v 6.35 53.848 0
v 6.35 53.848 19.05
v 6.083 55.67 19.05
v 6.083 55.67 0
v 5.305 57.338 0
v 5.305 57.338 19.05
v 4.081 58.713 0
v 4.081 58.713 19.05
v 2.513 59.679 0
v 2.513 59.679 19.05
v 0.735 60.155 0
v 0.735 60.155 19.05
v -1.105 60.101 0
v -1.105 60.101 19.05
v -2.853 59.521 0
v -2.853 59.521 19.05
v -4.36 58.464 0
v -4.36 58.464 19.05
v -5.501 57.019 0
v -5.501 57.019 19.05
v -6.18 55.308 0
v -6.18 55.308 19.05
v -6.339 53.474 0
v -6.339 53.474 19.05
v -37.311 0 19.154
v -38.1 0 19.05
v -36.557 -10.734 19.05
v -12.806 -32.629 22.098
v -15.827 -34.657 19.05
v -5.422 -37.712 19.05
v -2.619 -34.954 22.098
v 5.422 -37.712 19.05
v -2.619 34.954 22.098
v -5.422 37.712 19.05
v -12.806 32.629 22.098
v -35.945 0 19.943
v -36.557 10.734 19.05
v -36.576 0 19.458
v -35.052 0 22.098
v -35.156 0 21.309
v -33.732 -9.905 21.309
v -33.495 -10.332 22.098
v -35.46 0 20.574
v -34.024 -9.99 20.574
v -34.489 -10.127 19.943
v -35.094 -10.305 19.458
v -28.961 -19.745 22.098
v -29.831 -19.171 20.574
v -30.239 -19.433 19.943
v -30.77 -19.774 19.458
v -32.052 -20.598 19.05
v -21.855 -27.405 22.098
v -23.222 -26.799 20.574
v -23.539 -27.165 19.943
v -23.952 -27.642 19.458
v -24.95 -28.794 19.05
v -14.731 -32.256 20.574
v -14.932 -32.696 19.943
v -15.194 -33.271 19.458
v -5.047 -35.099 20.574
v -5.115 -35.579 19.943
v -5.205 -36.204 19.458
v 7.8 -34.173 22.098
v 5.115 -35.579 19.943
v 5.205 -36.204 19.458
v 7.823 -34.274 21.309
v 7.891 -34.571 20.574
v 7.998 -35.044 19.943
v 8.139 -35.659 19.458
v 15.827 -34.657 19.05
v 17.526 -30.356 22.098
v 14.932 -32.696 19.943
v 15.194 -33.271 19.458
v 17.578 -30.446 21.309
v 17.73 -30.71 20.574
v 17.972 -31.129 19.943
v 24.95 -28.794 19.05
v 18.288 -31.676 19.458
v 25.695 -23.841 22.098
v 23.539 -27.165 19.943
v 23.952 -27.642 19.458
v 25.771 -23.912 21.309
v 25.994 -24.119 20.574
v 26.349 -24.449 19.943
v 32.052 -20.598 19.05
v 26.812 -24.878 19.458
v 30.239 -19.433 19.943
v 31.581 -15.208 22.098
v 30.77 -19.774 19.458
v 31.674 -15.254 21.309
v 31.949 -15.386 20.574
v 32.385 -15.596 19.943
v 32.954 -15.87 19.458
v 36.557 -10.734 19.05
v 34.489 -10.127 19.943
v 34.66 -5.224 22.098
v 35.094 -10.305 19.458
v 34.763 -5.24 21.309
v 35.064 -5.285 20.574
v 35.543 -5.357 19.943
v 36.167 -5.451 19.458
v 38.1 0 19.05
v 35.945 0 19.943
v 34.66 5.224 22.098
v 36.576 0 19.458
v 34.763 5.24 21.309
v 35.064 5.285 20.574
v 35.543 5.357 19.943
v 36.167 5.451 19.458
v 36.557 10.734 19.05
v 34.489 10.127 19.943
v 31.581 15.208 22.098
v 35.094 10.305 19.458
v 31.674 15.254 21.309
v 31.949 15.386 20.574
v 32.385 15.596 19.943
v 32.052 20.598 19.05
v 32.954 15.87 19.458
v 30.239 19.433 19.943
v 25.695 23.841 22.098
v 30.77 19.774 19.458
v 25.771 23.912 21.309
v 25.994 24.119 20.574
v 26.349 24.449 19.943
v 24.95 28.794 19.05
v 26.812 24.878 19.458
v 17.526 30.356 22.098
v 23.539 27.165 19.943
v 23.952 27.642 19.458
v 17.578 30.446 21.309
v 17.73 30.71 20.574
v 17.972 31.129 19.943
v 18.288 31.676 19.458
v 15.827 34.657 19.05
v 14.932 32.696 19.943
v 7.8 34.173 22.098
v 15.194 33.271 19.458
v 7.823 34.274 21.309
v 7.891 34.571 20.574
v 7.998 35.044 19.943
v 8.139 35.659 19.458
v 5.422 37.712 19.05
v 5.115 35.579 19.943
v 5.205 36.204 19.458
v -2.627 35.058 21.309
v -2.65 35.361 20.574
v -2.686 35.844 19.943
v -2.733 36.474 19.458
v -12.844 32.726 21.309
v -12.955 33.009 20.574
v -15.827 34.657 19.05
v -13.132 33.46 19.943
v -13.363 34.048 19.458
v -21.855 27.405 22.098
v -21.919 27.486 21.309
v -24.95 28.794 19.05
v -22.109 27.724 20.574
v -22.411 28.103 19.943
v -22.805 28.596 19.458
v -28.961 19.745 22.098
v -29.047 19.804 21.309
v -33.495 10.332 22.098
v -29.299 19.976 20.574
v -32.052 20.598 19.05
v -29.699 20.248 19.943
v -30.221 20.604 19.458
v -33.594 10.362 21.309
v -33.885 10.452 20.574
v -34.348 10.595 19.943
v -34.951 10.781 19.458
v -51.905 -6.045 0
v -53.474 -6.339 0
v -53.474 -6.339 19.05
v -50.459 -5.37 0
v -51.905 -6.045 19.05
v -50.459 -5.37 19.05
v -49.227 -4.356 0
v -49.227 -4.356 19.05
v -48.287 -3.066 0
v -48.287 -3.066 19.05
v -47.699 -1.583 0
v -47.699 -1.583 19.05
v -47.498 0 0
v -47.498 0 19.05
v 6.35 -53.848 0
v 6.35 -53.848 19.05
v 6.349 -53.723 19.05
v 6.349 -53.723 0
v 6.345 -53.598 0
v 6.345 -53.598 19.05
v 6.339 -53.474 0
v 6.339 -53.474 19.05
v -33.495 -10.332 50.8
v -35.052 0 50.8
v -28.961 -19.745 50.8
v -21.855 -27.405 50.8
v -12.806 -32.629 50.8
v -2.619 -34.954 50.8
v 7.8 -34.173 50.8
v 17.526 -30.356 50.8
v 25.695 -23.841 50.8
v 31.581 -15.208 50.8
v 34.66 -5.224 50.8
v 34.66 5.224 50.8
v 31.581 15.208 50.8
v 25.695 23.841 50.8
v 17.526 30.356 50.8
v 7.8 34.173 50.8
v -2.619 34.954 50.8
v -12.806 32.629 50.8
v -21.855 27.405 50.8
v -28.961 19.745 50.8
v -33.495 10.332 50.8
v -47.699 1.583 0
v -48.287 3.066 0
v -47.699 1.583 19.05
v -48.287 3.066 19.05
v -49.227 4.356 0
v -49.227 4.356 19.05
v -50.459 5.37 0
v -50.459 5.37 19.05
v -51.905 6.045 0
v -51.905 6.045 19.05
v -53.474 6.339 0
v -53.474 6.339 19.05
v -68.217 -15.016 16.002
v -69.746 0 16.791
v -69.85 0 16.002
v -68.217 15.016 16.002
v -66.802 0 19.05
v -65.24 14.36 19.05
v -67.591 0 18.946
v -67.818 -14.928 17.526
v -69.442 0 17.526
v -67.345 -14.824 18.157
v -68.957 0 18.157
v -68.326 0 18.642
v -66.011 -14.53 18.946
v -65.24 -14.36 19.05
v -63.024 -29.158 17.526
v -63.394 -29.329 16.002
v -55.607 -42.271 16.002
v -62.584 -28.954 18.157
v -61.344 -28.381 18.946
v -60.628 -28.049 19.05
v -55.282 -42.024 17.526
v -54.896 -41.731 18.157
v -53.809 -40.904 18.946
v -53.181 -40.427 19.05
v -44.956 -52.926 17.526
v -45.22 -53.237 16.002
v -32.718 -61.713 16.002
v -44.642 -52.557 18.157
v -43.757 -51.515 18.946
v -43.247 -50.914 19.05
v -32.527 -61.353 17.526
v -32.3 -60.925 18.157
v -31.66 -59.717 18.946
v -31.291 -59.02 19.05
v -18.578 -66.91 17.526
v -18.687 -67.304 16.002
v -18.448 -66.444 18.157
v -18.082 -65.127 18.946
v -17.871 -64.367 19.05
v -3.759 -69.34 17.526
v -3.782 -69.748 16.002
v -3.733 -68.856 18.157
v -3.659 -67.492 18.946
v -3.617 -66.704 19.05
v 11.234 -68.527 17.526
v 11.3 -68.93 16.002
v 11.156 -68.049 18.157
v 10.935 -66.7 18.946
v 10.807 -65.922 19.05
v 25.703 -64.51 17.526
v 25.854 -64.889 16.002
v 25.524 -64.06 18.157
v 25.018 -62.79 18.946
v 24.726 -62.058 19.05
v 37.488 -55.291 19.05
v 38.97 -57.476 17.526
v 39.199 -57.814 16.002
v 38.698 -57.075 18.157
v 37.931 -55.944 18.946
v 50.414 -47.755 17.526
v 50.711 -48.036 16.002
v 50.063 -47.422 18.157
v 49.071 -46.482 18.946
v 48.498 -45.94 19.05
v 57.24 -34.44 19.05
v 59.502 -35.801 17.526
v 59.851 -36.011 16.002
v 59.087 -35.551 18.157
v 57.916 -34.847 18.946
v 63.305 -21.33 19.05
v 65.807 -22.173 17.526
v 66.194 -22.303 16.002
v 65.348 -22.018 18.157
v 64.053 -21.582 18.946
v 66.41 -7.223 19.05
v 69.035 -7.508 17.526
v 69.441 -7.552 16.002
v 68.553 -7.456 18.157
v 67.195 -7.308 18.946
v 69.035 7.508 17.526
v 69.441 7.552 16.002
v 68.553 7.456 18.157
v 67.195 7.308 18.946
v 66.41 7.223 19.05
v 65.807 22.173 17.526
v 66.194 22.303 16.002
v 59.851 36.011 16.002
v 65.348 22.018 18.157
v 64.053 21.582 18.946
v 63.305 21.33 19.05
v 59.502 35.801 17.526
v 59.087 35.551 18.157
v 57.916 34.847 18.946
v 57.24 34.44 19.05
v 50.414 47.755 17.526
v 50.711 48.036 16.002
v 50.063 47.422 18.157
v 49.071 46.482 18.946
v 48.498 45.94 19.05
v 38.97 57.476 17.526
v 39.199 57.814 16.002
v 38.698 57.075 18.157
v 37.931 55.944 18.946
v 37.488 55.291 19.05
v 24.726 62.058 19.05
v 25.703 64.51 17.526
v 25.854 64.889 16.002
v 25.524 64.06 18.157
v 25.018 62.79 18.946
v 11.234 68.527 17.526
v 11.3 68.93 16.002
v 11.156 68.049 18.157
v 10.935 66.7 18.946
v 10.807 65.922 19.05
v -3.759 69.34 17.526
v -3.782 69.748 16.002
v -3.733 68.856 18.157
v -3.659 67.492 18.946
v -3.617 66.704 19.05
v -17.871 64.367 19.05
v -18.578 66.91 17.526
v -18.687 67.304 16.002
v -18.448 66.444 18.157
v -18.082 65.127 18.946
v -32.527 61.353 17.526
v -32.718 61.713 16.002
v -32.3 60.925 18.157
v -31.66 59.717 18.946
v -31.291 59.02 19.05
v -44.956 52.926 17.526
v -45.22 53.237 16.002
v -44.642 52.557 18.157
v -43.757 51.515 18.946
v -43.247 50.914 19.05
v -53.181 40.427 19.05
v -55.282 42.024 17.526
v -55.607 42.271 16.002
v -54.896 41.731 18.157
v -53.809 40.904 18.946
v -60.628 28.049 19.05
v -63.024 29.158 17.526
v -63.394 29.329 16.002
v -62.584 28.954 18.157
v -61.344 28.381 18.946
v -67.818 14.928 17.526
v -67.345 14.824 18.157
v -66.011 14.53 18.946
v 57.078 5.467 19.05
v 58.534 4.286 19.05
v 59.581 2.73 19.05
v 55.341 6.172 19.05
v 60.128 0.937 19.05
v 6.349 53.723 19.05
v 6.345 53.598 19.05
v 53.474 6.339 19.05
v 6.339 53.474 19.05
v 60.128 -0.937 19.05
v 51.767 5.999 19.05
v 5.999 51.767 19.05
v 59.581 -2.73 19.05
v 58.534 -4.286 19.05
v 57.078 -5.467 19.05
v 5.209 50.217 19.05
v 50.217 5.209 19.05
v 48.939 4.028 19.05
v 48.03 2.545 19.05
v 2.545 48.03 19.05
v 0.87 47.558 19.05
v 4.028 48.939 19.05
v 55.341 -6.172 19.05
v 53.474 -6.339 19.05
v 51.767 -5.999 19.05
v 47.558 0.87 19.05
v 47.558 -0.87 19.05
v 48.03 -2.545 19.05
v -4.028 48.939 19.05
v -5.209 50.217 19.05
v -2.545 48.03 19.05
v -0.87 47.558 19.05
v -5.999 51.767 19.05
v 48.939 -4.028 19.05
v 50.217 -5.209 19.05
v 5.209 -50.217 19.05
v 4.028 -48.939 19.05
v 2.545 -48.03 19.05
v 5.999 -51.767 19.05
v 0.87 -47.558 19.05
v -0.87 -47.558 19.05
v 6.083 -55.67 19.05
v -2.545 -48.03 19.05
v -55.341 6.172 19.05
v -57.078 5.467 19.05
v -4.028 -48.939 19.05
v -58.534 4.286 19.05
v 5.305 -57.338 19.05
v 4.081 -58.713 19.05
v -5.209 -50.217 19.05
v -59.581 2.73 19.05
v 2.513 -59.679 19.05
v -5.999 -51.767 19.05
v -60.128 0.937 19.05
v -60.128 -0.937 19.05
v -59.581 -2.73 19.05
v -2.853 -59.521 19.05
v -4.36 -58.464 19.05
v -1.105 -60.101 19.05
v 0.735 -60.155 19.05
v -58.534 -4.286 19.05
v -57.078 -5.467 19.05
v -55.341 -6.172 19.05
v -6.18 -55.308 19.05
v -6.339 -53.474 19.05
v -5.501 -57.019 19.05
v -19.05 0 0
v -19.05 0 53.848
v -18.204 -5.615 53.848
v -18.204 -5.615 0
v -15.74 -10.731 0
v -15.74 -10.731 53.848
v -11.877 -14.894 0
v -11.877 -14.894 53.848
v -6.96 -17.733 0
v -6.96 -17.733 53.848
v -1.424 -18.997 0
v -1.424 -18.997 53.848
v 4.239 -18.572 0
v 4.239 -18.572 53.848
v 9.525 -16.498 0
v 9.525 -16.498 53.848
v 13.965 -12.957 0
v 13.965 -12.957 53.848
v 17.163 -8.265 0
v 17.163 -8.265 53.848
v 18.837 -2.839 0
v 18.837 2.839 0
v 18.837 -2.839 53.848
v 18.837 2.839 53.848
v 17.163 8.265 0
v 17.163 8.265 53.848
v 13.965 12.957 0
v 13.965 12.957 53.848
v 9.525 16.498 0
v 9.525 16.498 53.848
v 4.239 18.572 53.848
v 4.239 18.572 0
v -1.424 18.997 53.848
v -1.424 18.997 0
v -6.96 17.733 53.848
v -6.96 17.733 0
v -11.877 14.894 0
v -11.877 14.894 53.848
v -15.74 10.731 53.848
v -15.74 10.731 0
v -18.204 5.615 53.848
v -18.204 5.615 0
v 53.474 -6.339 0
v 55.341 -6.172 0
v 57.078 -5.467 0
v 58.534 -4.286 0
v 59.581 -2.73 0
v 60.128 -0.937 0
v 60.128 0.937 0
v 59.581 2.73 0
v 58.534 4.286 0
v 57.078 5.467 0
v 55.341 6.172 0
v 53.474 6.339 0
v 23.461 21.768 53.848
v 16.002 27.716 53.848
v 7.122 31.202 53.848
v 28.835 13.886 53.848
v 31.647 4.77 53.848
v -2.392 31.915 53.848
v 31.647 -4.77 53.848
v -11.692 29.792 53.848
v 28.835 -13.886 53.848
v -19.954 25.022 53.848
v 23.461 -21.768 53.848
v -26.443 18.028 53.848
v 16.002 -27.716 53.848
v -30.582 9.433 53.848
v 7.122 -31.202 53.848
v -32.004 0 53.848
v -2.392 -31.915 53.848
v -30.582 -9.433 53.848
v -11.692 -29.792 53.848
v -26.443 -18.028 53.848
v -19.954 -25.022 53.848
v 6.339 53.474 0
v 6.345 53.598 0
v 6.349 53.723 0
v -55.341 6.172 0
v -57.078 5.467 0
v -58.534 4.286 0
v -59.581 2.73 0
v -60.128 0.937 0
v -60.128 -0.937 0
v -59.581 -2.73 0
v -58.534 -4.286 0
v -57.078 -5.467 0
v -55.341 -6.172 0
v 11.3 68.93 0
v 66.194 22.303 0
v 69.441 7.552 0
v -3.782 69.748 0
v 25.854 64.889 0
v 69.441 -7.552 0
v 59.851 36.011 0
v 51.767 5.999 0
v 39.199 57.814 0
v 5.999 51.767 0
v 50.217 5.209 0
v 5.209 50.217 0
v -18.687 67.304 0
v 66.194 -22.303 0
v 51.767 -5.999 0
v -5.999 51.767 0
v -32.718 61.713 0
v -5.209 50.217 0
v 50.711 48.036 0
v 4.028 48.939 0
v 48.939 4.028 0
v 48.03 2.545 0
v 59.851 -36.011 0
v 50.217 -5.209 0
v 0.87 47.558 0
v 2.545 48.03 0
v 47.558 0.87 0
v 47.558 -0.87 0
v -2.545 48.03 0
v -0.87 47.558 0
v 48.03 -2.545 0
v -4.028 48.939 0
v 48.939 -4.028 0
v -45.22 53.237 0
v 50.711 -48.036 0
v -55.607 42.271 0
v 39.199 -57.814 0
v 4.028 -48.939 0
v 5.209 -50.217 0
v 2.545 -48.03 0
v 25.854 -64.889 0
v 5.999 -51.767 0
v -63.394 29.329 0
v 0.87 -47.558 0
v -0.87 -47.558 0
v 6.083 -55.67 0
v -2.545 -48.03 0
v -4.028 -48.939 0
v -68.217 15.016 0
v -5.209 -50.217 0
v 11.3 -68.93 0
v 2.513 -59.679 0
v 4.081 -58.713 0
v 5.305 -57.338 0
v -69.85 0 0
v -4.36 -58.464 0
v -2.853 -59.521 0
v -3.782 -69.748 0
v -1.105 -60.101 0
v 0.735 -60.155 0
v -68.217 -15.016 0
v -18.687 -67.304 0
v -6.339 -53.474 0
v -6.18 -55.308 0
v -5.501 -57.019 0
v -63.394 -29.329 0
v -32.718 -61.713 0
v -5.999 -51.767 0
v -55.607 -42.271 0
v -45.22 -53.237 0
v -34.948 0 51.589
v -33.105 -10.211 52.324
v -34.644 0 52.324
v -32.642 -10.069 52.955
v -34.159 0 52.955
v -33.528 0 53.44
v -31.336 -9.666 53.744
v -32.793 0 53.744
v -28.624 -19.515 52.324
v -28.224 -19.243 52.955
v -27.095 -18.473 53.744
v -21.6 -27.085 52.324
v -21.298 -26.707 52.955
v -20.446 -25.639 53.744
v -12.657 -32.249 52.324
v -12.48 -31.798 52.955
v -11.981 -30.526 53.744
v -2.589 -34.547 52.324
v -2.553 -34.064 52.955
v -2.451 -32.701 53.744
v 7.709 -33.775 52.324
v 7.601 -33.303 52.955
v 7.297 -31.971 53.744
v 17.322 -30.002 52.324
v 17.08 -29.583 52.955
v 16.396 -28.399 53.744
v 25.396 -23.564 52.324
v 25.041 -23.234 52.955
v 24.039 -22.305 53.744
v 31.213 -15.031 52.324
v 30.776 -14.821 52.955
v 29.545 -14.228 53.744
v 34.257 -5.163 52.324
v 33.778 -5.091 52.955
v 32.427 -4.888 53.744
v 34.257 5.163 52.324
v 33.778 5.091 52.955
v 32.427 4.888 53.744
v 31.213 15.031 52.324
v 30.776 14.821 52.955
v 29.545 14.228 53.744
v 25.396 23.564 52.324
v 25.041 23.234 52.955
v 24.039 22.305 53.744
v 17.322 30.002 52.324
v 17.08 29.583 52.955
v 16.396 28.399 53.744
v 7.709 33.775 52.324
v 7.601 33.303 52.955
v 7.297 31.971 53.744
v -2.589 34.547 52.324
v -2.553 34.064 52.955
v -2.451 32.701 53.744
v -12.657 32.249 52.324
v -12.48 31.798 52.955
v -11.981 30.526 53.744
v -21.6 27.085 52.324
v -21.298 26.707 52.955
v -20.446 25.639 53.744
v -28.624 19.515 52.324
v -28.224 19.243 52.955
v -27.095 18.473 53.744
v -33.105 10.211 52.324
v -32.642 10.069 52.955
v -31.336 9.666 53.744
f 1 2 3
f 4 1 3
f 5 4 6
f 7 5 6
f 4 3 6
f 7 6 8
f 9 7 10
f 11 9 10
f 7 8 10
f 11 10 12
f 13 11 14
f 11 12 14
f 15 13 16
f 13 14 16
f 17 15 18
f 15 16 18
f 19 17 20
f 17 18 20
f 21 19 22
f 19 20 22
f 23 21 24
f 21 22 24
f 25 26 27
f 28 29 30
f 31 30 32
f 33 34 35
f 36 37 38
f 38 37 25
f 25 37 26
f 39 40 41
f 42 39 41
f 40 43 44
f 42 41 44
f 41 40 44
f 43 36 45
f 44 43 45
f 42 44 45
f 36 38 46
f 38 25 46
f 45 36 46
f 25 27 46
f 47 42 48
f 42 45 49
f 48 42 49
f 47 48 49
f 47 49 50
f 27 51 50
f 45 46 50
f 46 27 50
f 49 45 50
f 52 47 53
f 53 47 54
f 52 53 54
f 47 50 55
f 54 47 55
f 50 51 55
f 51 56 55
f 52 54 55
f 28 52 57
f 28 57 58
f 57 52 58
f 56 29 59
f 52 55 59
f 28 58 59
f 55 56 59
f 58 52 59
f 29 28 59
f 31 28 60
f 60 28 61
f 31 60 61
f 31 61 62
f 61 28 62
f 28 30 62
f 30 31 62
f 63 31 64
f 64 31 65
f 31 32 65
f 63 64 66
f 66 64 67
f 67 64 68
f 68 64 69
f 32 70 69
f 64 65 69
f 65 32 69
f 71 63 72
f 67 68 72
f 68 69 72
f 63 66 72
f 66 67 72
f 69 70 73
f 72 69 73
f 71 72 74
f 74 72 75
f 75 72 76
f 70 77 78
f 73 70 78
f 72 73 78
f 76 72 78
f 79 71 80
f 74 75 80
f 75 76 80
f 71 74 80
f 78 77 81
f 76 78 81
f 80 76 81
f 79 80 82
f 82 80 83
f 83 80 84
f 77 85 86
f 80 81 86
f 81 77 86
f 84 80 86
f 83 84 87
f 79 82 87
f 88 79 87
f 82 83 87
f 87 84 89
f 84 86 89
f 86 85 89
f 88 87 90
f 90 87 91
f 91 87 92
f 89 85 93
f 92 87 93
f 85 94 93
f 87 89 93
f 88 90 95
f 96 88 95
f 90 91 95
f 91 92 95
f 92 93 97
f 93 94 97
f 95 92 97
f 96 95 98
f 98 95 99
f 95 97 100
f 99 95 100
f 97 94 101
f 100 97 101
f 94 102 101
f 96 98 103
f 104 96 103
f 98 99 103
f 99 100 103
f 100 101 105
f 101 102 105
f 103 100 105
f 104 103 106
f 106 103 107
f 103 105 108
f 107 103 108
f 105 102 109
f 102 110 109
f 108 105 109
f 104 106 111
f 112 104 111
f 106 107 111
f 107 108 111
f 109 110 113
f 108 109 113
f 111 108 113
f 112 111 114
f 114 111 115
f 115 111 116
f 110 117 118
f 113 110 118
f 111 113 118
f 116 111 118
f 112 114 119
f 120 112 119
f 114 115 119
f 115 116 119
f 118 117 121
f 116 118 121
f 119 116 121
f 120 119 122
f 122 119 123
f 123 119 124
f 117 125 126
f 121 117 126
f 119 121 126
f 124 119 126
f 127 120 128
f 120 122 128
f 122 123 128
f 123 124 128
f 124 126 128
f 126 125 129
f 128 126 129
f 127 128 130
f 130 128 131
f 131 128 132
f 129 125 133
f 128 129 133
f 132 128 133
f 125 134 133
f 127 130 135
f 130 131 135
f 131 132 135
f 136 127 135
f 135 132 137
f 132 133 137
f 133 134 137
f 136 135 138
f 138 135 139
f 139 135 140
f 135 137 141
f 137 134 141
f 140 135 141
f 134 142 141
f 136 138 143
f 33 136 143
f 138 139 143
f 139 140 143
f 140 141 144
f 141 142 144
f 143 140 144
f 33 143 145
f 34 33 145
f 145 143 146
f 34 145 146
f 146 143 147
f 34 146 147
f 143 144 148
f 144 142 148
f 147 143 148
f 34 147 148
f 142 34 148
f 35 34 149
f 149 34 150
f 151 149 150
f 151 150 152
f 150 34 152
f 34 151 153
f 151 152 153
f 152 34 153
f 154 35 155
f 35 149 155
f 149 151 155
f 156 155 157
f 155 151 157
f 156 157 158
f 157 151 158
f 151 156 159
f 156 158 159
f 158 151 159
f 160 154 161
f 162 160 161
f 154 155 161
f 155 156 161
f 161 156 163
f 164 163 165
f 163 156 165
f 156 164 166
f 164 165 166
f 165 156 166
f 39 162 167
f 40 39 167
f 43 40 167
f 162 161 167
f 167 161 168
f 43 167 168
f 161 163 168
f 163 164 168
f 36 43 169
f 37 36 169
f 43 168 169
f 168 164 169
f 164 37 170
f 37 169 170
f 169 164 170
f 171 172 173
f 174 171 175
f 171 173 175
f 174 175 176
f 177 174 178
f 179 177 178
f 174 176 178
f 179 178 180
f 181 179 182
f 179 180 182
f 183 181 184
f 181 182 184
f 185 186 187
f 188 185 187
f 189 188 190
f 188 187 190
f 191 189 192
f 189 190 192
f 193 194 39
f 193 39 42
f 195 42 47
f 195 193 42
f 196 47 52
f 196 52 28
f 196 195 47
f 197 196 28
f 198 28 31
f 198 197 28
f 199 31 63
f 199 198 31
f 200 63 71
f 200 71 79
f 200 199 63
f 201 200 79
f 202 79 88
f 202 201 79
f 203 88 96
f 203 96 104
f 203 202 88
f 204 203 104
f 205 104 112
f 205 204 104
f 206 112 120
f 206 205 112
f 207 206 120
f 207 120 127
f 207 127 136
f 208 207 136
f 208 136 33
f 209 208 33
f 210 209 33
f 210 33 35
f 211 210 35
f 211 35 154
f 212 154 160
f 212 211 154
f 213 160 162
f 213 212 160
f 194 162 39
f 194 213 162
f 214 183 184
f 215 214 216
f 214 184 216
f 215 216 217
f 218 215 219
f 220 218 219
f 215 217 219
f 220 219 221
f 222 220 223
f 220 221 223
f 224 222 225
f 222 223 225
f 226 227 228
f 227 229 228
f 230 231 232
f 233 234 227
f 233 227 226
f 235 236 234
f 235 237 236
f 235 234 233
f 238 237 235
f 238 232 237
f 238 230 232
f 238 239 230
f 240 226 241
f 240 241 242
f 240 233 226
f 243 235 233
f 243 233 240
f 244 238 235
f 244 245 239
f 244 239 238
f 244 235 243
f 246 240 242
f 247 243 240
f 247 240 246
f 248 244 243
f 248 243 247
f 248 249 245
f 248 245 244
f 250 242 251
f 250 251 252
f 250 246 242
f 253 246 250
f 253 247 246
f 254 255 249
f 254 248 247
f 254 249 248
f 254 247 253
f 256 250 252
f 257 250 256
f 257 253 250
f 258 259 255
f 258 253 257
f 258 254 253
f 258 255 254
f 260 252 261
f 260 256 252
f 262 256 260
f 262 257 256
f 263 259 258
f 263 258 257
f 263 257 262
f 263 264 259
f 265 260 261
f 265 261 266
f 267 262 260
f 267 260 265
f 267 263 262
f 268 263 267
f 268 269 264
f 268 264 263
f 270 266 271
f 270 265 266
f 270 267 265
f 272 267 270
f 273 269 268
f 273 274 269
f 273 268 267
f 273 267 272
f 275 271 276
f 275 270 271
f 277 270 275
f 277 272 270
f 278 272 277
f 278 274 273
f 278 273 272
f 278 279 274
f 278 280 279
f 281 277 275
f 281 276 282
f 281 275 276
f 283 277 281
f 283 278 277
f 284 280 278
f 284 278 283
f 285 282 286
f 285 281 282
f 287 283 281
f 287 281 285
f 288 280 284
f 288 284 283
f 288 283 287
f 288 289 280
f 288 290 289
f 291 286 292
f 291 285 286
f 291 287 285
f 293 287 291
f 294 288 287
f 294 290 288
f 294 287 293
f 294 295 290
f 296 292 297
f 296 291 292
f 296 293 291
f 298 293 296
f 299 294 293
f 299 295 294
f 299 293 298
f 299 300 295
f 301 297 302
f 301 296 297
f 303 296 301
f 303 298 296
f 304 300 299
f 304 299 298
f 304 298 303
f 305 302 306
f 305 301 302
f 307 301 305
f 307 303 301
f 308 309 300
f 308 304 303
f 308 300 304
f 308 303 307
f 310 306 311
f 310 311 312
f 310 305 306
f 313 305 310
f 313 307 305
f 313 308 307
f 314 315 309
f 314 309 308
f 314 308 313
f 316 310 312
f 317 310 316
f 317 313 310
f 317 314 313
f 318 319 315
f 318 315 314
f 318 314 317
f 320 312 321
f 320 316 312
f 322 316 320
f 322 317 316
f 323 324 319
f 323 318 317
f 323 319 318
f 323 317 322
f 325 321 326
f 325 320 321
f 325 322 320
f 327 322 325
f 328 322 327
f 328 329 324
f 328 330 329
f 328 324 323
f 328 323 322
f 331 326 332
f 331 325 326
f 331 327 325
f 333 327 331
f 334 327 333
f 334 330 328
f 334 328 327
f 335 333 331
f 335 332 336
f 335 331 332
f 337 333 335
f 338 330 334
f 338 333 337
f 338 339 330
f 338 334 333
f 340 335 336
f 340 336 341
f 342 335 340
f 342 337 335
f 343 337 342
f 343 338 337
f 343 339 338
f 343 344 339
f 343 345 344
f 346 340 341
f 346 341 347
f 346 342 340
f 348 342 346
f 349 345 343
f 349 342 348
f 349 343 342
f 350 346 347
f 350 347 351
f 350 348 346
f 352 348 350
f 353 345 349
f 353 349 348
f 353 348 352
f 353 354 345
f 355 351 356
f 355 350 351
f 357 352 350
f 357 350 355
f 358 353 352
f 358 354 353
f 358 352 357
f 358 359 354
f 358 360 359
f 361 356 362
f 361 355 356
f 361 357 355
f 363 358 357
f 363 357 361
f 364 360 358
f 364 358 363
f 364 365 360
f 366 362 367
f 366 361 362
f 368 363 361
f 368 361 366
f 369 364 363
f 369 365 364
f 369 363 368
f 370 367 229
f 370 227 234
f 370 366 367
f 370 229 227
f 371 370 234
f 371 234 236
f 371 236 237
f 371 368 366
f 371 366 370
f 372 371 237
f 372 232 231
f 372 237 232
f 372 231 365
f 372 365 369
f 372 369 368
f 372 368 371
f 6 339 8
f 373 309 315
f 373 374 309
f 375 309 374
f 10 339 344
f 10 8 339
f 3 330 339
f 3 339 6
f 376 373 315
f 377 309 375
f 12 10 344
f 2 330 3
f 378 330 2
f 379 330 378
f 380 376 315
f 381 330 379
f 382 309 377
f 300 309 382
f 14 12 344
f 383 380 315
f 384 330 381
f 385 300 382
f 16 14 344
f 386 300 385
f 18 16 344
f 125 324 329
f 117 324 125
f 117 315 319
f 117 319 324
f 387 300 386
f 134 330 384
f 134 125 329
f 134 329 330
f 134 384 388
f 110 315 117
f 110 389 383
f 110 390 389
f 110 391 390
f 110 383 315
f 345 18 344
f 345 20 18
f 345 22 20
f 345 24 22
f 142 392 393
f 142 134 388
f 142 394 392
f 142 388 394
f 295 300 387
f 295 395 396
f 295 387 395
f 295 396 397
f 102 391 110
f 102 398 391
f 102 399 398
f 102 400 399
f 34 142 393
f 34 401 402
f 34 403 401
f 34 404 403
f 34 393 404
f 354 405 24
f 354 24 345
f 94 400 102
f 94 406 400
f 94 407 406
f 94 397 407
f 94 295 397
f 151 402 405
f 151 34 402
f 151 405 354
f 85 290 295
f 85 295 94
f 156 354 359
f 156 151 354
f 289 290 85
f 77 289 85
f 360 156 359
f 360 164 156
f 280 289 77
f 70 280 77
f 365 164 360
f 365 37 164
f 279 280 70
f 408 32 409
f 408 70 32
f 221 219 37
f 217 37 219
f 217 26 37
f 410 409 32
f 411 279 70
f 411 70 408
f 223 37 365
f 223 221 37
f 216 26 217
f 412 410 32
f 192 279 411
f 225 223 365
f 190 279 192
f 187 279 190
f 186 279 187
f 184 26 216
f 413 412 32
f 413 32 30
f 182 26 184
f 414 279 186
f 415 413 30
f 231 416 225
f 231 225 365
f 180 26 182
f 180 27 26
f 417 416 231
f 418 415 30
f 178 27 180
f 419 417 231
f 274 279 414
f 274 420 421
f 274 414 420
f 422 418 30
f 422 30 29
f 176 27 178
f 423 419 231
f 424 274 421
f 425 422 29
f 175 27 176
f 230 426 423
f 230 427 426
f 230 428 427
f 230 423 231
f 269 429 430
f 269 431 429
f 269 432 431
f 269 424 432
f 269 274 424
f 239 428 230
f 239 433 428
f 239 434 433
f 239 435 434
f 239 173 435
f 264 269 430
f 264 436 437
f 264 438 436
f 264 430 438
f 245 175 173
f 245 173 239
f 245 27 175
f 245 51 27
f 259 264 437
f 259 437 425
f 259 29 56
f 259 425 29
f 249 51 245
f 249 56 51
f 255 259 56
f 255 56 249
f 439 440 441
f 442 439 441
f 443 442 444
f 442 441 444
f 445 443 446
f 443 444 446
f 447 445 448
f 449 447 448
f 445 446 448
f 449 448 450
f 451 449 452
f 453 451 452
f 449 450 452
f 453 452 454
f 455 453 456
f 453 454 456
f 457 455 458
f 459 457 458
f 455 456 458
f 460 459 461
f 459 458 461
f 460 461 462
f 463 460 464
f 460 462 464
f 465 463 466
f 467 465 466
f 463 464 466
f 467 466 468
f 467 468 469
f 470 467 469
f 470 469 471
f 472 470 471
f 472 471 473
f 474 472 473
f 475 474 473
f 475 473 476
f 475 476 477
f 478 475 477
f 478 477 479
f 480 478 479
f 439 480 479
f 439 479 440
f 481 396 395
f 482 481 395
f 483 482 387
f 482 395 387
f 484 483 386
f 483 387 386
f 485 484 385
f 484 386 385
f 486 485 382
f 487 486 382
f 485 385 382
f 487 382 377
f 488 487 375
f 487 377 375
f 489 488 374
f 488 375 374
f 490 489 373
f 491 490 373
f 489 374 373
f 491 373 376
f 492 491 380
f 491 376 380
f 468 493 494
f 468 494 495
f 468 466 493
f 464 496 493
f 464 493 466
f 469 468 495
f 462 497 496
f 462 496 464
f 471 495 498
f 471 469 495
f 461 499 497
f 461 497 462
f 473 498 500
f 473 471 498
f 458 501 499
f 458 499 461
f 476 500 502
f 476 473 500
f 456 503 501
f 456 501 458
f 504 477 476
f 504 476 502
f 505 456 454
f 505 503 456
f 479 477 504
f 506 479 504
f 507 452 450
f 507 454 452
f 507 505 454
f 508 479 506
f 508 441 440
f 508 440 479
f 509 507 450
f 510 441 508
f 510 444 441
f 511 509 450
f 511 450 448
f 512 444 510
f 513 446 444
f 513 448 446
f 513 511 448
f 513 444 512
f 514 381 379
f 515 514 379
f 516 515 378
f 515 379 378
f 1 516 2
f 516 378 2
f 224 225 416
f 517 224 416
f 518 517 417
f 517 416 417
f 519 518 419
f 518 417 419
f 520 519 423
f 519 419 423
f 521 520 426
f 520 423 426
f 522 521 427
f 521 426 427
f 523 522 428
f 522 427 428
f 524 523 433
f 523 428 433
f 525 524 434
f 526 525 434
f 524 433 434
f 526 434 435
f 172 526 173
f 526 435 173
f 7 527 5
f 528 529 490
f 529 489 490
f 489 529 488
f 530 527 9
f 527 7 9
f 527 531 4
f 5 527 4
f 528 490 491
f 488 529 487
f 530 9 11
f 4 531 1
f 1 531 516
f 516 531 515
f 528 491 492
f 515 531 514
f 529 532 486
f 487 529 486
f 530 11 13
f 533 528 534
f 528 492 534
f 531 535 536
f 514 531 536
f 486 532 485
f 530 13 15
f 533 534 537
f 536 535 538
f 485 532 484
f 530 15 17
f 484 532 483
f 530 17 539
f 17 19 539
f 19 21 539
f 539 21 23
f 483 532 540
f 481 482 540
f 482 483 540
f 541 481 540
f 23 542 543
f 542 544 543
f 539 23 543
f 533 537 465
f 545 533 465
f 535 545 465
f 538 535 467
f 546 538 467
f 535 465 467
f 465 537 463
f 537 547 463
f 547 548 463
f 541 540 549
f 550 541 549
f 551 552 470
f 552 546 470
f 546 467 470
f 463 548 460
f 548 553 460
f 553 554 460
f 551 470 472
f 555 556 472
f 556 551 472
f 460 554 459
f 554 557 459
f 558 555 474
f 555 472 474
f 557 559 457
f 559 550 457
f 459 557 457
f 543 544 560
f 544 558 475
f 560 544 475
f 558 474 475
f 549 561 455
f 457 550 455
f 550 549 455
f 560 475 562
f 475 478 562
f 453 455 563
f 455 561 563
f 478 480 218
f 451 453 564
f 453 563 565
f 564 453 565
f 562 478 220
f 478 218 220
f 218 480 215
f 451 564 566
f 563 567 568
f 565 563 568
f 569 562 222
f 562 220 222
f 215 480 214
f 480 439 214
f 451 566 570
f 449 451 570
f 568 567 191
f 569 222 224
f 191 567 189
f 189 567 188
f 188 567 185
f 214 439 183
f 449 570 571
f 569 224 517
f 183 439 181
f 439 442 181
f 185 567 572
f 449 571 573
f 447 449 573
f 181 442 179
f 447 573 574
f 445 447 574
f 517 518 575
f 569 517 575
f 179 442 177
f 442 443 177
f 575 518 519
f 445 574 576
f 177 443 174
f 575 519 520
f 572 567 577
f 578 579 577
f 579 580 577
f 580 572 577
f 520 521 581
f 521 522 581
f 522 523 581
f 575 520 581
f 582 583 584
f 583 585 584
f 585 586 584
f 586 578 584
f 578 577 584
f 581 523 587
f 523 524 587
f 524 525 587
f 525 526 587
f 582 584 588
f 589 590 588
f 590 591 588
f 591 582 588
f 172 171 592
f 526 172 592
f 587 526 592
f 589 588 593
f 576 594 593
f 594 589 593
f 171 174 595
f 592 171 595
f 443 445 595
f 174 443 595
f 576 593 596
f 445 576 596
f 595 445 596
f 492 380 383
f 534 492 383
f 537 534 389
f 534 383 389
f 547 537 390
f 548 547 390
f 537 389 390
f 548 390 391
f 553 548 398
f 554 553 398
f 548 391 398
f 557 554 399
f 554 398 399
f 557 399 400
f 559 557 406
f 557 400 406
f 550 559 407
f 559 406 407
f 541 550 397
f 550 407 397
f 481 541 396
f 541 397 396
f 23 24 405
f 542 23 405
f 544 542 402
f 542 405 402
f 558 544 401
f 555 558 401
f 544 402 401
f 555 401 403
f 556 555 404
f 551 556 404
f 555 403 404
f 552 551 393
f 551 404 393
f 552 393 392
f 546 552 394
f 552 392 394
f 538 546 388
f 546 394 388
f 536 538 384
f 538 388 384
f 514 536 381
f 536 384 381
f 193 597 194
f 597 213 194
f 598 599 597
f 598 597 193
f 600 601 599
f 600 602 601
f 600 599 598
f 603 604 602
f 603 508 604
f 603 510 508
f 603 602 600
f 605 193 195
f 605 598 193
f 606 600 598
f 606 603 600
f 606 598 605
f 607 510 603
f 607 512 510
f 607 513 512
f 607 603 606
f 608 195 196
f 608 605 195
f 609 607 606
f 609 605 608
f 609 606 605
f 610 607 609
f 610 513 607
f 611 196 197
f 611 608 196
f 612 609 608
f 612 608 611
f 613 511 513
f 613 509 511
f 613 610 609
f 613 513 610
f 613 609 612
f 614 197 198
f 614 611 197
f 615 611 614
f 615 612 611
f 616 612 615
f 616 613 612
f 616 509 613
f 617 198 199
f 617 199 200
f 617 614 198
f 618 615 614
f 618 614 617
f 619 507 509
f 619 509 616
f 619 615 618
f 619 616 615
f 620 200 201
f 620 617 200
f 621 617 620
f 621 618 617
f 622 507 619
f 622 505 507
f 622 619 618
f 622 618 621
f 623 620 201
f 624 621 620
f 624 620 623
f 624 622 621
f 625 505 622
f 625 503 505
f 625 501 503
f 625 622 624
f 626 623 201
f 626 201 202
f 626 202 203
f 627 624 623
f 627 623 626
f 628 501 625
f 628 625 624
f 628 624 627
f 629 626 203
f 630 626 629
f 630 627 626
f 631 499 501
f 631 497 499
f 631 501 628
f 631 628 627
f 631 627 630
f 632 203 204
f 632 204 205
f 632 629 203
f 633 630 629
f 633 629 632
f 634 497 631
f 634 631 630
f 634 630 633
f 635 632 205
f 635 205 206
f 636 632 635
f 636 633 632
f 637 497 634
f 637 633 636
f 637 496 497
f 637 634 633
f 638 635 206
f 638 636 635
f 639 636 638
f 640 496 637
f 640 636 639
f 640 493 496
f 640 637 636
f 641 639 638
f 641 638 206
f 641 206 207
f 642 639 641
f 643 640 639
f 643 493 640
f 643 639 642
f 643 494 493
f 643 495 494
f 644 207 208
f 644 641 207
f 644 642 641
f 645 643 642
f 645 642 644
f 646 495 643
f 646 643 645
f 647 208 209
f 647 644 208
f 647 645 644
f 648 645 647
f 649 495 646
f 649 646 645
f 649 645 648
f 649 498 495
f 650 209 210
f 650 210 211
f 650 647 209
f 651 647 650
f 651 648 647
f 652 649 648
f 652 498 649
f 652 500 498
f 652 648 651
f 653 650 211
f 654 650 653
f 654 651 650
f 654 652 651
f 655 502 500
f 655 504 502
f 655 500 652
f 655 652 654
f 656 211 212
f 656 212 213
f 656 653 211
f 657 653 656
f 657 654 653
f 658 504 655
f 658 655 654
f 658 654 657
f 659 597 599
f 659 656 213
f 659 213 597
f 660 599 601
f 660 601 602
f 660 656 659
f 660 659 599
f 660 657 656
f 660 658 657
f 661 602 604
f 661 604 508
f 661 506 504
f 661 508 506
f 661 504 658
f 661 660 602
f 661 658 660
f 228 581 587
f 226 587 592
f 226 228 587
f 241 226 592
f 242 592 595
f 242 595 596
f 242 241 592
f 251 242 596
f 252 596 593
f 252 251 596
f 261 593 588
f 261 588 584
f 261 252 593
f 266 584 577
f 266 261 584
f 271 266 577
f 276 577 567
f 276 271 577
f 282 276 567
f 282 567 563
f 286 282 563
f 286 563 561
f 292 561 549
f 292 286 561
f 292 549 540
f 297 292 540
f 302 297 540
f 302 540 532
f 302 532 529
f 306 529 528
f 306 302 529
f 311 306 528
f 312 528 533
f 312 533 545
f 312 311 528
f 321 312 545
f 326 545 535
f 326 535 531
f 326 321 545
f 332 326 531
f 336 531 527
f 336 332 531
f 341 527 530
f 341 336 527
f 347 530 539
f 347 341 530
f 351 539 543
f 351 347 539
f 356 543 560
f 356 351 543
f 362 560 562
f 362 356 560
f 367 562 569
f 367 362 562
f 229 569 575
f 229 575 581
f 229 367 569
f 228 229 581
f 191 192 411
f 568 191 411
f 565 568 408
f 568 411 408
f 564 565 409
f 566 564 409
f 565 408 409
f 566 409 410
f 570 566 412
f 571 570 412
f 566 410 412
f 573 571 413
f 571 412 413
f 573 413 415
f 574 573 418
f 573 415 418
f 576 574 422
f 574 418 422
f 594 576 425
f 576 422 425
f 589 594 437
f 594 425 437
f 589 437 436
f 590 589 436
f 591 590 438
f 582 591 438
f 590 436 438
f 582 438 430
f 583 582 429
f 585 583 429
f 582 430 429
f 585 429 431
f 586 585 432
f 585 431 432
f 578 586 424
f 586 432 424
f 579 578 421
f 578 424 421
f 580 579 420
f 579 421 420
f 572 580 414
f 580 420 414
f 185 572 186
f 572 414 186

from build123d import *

# Parameters (mm, degrees)
F0_W     = 50.8
F0_H     = 19.05
F2_W     = 16.002
F2_H     = 34.798
F4_R     = 3.048
F6_DEPTH = 19.051


with BuildPart() as f1:
    # F0 (on Front) → F1 (revolve)
    with BuildSketch(Plane.XZ):
        with Locations((-44.45, 9.525)):
            Rectangle(F0_W, F0_H)
    revolve(axis=Axis((0, 0, 39.3560769007), (0, 0, 1)))

    # F2 (on Front) → F3 (revolve)
    with BuildSketch(Plane.XZ):
        with Locations((-27.051, 36.449)):
            Rectangle(F2_W, F2_H)
    revolve(axis=Axis((0, 0, 39.3560769007), (0, 0, 1)))

    # F4
    f4_edges = [f1.edges().sort_by_distance(p)[0] for p in [
        (35.052, 0, 53.848),
        (69.85, 0, 19.05),
        (35.052, 0, 19.05),
    ]]
    fillet(f4_edges, radius=F4_R)

    # F5 (on face) → F6 (cut, through all)
    with BuildSketch(Plane.XY.offset(19.05)):
        with BuildLine():
            ThreePointArc((-6.3389523479, 53.4735896226), (0, 47.498), (6.3389523479, 53.4735896226))
            ThreePointArc((6.3389523479, 53.4735896226), (0, 53.848), (-6.3389523479, 53.4735896226))
        make_face()
        with BuildLine():
            ThreePointArc((-6.3389523479, 53.4735896226), (0, 53.848), (6.3389523479, 53.4735896226))
            ThreePointArc((6.3389523479, 53.4735896226), (6.3472374861, 53.6607133338), (6.35, 53.848))
            ThreePointArc((6.35, 53.848), (-0.1872866662, 60.1952374861), (-6.3389523479, 53.4735896226))
        make_face()
        with BuildLine():
            ThreePointArc((-47.498, 0), (-49.2273936601, 4.3557429965), (-53.4735896226, 6.3389523479))
            ThreePointArc((-53.4735896226, 6.3389523479), (-53.848, 0), (-53.4735896226, -6.3389523479))
            ThreePointArc((-53.4735896226, -6.3389523479), (-49.2273936601, -4.3557429965), (-47.498, 0))
        make_face()
        with BuildLine():
            ThreePointArc((-53.4735896226, -6.3389523479), (-53.848, 0), (-53.4735896226, 6.3389523479))
            ThreePointArc((-53.4735896226, 6.3389523479), (-60.198, 0), (-53.4735896226, -6.3389523479))
        make_face()
        with BuildLine():
            ThreePointArc((53.4735896226, 6.3389523479), (53.7543159104, 3.175), (53.848, 0))
            ThreePointArc((53.848, 0), (53.7543159104, -3.175), (53.4735896226, -6.3389523479))
            ThreePointArc((53.4735896226, -6.3389523479), (58.2037429965, -4.6206063399), (60.198, 0))
            ThreePointArc((60.198, 0), (58.2037429965, 4.6206063399), (53.4735896226, 6.3389523479))
        make_face()
        with BuildLine():
            ThreePointArc((53.4735896226, -6.3389523479), (53.7543159104, -3.175), (53.848, 0))
            ThreePointArc((53.848, 0), (53.7543159104, 3.175), (53.4735896226, 6.3389523479))
            ThreePointArc((53.4735896226, 6.3389523479), (47.498, 0), (53.4735896226, -6.3389523479))
        make_face()
        with BuildLine():
            ThreePointArc((-6.3389523479, -53.4735896226), (0, -53.848), (6.3389523479, -53.4735896226))
            ThreePointArc((6.3389523479, -53.4735896226), (0, -47.498), (-6.3389523479, -53.4735896226))
        make_face()
        with BuildLine():
            ThreePointArc((6.35, -53.848), (6.3472374861, -53.6607133338), (6.3389523479, -53.4735896226))
            ThreePointArc((6.3389523479, -53.4735896226), (0, -53.848), (-6.3389523479, -53.4735896226))
            ThreePointArc((-6.3389523479, -53.4735896226), (-0.1872866662, -60.1952374861), (6.35, -53.848))
        make_face()
    extrude(amount=-F6_DEPTH, mode=Mode.SUBTRACT)


solid = f1.part
